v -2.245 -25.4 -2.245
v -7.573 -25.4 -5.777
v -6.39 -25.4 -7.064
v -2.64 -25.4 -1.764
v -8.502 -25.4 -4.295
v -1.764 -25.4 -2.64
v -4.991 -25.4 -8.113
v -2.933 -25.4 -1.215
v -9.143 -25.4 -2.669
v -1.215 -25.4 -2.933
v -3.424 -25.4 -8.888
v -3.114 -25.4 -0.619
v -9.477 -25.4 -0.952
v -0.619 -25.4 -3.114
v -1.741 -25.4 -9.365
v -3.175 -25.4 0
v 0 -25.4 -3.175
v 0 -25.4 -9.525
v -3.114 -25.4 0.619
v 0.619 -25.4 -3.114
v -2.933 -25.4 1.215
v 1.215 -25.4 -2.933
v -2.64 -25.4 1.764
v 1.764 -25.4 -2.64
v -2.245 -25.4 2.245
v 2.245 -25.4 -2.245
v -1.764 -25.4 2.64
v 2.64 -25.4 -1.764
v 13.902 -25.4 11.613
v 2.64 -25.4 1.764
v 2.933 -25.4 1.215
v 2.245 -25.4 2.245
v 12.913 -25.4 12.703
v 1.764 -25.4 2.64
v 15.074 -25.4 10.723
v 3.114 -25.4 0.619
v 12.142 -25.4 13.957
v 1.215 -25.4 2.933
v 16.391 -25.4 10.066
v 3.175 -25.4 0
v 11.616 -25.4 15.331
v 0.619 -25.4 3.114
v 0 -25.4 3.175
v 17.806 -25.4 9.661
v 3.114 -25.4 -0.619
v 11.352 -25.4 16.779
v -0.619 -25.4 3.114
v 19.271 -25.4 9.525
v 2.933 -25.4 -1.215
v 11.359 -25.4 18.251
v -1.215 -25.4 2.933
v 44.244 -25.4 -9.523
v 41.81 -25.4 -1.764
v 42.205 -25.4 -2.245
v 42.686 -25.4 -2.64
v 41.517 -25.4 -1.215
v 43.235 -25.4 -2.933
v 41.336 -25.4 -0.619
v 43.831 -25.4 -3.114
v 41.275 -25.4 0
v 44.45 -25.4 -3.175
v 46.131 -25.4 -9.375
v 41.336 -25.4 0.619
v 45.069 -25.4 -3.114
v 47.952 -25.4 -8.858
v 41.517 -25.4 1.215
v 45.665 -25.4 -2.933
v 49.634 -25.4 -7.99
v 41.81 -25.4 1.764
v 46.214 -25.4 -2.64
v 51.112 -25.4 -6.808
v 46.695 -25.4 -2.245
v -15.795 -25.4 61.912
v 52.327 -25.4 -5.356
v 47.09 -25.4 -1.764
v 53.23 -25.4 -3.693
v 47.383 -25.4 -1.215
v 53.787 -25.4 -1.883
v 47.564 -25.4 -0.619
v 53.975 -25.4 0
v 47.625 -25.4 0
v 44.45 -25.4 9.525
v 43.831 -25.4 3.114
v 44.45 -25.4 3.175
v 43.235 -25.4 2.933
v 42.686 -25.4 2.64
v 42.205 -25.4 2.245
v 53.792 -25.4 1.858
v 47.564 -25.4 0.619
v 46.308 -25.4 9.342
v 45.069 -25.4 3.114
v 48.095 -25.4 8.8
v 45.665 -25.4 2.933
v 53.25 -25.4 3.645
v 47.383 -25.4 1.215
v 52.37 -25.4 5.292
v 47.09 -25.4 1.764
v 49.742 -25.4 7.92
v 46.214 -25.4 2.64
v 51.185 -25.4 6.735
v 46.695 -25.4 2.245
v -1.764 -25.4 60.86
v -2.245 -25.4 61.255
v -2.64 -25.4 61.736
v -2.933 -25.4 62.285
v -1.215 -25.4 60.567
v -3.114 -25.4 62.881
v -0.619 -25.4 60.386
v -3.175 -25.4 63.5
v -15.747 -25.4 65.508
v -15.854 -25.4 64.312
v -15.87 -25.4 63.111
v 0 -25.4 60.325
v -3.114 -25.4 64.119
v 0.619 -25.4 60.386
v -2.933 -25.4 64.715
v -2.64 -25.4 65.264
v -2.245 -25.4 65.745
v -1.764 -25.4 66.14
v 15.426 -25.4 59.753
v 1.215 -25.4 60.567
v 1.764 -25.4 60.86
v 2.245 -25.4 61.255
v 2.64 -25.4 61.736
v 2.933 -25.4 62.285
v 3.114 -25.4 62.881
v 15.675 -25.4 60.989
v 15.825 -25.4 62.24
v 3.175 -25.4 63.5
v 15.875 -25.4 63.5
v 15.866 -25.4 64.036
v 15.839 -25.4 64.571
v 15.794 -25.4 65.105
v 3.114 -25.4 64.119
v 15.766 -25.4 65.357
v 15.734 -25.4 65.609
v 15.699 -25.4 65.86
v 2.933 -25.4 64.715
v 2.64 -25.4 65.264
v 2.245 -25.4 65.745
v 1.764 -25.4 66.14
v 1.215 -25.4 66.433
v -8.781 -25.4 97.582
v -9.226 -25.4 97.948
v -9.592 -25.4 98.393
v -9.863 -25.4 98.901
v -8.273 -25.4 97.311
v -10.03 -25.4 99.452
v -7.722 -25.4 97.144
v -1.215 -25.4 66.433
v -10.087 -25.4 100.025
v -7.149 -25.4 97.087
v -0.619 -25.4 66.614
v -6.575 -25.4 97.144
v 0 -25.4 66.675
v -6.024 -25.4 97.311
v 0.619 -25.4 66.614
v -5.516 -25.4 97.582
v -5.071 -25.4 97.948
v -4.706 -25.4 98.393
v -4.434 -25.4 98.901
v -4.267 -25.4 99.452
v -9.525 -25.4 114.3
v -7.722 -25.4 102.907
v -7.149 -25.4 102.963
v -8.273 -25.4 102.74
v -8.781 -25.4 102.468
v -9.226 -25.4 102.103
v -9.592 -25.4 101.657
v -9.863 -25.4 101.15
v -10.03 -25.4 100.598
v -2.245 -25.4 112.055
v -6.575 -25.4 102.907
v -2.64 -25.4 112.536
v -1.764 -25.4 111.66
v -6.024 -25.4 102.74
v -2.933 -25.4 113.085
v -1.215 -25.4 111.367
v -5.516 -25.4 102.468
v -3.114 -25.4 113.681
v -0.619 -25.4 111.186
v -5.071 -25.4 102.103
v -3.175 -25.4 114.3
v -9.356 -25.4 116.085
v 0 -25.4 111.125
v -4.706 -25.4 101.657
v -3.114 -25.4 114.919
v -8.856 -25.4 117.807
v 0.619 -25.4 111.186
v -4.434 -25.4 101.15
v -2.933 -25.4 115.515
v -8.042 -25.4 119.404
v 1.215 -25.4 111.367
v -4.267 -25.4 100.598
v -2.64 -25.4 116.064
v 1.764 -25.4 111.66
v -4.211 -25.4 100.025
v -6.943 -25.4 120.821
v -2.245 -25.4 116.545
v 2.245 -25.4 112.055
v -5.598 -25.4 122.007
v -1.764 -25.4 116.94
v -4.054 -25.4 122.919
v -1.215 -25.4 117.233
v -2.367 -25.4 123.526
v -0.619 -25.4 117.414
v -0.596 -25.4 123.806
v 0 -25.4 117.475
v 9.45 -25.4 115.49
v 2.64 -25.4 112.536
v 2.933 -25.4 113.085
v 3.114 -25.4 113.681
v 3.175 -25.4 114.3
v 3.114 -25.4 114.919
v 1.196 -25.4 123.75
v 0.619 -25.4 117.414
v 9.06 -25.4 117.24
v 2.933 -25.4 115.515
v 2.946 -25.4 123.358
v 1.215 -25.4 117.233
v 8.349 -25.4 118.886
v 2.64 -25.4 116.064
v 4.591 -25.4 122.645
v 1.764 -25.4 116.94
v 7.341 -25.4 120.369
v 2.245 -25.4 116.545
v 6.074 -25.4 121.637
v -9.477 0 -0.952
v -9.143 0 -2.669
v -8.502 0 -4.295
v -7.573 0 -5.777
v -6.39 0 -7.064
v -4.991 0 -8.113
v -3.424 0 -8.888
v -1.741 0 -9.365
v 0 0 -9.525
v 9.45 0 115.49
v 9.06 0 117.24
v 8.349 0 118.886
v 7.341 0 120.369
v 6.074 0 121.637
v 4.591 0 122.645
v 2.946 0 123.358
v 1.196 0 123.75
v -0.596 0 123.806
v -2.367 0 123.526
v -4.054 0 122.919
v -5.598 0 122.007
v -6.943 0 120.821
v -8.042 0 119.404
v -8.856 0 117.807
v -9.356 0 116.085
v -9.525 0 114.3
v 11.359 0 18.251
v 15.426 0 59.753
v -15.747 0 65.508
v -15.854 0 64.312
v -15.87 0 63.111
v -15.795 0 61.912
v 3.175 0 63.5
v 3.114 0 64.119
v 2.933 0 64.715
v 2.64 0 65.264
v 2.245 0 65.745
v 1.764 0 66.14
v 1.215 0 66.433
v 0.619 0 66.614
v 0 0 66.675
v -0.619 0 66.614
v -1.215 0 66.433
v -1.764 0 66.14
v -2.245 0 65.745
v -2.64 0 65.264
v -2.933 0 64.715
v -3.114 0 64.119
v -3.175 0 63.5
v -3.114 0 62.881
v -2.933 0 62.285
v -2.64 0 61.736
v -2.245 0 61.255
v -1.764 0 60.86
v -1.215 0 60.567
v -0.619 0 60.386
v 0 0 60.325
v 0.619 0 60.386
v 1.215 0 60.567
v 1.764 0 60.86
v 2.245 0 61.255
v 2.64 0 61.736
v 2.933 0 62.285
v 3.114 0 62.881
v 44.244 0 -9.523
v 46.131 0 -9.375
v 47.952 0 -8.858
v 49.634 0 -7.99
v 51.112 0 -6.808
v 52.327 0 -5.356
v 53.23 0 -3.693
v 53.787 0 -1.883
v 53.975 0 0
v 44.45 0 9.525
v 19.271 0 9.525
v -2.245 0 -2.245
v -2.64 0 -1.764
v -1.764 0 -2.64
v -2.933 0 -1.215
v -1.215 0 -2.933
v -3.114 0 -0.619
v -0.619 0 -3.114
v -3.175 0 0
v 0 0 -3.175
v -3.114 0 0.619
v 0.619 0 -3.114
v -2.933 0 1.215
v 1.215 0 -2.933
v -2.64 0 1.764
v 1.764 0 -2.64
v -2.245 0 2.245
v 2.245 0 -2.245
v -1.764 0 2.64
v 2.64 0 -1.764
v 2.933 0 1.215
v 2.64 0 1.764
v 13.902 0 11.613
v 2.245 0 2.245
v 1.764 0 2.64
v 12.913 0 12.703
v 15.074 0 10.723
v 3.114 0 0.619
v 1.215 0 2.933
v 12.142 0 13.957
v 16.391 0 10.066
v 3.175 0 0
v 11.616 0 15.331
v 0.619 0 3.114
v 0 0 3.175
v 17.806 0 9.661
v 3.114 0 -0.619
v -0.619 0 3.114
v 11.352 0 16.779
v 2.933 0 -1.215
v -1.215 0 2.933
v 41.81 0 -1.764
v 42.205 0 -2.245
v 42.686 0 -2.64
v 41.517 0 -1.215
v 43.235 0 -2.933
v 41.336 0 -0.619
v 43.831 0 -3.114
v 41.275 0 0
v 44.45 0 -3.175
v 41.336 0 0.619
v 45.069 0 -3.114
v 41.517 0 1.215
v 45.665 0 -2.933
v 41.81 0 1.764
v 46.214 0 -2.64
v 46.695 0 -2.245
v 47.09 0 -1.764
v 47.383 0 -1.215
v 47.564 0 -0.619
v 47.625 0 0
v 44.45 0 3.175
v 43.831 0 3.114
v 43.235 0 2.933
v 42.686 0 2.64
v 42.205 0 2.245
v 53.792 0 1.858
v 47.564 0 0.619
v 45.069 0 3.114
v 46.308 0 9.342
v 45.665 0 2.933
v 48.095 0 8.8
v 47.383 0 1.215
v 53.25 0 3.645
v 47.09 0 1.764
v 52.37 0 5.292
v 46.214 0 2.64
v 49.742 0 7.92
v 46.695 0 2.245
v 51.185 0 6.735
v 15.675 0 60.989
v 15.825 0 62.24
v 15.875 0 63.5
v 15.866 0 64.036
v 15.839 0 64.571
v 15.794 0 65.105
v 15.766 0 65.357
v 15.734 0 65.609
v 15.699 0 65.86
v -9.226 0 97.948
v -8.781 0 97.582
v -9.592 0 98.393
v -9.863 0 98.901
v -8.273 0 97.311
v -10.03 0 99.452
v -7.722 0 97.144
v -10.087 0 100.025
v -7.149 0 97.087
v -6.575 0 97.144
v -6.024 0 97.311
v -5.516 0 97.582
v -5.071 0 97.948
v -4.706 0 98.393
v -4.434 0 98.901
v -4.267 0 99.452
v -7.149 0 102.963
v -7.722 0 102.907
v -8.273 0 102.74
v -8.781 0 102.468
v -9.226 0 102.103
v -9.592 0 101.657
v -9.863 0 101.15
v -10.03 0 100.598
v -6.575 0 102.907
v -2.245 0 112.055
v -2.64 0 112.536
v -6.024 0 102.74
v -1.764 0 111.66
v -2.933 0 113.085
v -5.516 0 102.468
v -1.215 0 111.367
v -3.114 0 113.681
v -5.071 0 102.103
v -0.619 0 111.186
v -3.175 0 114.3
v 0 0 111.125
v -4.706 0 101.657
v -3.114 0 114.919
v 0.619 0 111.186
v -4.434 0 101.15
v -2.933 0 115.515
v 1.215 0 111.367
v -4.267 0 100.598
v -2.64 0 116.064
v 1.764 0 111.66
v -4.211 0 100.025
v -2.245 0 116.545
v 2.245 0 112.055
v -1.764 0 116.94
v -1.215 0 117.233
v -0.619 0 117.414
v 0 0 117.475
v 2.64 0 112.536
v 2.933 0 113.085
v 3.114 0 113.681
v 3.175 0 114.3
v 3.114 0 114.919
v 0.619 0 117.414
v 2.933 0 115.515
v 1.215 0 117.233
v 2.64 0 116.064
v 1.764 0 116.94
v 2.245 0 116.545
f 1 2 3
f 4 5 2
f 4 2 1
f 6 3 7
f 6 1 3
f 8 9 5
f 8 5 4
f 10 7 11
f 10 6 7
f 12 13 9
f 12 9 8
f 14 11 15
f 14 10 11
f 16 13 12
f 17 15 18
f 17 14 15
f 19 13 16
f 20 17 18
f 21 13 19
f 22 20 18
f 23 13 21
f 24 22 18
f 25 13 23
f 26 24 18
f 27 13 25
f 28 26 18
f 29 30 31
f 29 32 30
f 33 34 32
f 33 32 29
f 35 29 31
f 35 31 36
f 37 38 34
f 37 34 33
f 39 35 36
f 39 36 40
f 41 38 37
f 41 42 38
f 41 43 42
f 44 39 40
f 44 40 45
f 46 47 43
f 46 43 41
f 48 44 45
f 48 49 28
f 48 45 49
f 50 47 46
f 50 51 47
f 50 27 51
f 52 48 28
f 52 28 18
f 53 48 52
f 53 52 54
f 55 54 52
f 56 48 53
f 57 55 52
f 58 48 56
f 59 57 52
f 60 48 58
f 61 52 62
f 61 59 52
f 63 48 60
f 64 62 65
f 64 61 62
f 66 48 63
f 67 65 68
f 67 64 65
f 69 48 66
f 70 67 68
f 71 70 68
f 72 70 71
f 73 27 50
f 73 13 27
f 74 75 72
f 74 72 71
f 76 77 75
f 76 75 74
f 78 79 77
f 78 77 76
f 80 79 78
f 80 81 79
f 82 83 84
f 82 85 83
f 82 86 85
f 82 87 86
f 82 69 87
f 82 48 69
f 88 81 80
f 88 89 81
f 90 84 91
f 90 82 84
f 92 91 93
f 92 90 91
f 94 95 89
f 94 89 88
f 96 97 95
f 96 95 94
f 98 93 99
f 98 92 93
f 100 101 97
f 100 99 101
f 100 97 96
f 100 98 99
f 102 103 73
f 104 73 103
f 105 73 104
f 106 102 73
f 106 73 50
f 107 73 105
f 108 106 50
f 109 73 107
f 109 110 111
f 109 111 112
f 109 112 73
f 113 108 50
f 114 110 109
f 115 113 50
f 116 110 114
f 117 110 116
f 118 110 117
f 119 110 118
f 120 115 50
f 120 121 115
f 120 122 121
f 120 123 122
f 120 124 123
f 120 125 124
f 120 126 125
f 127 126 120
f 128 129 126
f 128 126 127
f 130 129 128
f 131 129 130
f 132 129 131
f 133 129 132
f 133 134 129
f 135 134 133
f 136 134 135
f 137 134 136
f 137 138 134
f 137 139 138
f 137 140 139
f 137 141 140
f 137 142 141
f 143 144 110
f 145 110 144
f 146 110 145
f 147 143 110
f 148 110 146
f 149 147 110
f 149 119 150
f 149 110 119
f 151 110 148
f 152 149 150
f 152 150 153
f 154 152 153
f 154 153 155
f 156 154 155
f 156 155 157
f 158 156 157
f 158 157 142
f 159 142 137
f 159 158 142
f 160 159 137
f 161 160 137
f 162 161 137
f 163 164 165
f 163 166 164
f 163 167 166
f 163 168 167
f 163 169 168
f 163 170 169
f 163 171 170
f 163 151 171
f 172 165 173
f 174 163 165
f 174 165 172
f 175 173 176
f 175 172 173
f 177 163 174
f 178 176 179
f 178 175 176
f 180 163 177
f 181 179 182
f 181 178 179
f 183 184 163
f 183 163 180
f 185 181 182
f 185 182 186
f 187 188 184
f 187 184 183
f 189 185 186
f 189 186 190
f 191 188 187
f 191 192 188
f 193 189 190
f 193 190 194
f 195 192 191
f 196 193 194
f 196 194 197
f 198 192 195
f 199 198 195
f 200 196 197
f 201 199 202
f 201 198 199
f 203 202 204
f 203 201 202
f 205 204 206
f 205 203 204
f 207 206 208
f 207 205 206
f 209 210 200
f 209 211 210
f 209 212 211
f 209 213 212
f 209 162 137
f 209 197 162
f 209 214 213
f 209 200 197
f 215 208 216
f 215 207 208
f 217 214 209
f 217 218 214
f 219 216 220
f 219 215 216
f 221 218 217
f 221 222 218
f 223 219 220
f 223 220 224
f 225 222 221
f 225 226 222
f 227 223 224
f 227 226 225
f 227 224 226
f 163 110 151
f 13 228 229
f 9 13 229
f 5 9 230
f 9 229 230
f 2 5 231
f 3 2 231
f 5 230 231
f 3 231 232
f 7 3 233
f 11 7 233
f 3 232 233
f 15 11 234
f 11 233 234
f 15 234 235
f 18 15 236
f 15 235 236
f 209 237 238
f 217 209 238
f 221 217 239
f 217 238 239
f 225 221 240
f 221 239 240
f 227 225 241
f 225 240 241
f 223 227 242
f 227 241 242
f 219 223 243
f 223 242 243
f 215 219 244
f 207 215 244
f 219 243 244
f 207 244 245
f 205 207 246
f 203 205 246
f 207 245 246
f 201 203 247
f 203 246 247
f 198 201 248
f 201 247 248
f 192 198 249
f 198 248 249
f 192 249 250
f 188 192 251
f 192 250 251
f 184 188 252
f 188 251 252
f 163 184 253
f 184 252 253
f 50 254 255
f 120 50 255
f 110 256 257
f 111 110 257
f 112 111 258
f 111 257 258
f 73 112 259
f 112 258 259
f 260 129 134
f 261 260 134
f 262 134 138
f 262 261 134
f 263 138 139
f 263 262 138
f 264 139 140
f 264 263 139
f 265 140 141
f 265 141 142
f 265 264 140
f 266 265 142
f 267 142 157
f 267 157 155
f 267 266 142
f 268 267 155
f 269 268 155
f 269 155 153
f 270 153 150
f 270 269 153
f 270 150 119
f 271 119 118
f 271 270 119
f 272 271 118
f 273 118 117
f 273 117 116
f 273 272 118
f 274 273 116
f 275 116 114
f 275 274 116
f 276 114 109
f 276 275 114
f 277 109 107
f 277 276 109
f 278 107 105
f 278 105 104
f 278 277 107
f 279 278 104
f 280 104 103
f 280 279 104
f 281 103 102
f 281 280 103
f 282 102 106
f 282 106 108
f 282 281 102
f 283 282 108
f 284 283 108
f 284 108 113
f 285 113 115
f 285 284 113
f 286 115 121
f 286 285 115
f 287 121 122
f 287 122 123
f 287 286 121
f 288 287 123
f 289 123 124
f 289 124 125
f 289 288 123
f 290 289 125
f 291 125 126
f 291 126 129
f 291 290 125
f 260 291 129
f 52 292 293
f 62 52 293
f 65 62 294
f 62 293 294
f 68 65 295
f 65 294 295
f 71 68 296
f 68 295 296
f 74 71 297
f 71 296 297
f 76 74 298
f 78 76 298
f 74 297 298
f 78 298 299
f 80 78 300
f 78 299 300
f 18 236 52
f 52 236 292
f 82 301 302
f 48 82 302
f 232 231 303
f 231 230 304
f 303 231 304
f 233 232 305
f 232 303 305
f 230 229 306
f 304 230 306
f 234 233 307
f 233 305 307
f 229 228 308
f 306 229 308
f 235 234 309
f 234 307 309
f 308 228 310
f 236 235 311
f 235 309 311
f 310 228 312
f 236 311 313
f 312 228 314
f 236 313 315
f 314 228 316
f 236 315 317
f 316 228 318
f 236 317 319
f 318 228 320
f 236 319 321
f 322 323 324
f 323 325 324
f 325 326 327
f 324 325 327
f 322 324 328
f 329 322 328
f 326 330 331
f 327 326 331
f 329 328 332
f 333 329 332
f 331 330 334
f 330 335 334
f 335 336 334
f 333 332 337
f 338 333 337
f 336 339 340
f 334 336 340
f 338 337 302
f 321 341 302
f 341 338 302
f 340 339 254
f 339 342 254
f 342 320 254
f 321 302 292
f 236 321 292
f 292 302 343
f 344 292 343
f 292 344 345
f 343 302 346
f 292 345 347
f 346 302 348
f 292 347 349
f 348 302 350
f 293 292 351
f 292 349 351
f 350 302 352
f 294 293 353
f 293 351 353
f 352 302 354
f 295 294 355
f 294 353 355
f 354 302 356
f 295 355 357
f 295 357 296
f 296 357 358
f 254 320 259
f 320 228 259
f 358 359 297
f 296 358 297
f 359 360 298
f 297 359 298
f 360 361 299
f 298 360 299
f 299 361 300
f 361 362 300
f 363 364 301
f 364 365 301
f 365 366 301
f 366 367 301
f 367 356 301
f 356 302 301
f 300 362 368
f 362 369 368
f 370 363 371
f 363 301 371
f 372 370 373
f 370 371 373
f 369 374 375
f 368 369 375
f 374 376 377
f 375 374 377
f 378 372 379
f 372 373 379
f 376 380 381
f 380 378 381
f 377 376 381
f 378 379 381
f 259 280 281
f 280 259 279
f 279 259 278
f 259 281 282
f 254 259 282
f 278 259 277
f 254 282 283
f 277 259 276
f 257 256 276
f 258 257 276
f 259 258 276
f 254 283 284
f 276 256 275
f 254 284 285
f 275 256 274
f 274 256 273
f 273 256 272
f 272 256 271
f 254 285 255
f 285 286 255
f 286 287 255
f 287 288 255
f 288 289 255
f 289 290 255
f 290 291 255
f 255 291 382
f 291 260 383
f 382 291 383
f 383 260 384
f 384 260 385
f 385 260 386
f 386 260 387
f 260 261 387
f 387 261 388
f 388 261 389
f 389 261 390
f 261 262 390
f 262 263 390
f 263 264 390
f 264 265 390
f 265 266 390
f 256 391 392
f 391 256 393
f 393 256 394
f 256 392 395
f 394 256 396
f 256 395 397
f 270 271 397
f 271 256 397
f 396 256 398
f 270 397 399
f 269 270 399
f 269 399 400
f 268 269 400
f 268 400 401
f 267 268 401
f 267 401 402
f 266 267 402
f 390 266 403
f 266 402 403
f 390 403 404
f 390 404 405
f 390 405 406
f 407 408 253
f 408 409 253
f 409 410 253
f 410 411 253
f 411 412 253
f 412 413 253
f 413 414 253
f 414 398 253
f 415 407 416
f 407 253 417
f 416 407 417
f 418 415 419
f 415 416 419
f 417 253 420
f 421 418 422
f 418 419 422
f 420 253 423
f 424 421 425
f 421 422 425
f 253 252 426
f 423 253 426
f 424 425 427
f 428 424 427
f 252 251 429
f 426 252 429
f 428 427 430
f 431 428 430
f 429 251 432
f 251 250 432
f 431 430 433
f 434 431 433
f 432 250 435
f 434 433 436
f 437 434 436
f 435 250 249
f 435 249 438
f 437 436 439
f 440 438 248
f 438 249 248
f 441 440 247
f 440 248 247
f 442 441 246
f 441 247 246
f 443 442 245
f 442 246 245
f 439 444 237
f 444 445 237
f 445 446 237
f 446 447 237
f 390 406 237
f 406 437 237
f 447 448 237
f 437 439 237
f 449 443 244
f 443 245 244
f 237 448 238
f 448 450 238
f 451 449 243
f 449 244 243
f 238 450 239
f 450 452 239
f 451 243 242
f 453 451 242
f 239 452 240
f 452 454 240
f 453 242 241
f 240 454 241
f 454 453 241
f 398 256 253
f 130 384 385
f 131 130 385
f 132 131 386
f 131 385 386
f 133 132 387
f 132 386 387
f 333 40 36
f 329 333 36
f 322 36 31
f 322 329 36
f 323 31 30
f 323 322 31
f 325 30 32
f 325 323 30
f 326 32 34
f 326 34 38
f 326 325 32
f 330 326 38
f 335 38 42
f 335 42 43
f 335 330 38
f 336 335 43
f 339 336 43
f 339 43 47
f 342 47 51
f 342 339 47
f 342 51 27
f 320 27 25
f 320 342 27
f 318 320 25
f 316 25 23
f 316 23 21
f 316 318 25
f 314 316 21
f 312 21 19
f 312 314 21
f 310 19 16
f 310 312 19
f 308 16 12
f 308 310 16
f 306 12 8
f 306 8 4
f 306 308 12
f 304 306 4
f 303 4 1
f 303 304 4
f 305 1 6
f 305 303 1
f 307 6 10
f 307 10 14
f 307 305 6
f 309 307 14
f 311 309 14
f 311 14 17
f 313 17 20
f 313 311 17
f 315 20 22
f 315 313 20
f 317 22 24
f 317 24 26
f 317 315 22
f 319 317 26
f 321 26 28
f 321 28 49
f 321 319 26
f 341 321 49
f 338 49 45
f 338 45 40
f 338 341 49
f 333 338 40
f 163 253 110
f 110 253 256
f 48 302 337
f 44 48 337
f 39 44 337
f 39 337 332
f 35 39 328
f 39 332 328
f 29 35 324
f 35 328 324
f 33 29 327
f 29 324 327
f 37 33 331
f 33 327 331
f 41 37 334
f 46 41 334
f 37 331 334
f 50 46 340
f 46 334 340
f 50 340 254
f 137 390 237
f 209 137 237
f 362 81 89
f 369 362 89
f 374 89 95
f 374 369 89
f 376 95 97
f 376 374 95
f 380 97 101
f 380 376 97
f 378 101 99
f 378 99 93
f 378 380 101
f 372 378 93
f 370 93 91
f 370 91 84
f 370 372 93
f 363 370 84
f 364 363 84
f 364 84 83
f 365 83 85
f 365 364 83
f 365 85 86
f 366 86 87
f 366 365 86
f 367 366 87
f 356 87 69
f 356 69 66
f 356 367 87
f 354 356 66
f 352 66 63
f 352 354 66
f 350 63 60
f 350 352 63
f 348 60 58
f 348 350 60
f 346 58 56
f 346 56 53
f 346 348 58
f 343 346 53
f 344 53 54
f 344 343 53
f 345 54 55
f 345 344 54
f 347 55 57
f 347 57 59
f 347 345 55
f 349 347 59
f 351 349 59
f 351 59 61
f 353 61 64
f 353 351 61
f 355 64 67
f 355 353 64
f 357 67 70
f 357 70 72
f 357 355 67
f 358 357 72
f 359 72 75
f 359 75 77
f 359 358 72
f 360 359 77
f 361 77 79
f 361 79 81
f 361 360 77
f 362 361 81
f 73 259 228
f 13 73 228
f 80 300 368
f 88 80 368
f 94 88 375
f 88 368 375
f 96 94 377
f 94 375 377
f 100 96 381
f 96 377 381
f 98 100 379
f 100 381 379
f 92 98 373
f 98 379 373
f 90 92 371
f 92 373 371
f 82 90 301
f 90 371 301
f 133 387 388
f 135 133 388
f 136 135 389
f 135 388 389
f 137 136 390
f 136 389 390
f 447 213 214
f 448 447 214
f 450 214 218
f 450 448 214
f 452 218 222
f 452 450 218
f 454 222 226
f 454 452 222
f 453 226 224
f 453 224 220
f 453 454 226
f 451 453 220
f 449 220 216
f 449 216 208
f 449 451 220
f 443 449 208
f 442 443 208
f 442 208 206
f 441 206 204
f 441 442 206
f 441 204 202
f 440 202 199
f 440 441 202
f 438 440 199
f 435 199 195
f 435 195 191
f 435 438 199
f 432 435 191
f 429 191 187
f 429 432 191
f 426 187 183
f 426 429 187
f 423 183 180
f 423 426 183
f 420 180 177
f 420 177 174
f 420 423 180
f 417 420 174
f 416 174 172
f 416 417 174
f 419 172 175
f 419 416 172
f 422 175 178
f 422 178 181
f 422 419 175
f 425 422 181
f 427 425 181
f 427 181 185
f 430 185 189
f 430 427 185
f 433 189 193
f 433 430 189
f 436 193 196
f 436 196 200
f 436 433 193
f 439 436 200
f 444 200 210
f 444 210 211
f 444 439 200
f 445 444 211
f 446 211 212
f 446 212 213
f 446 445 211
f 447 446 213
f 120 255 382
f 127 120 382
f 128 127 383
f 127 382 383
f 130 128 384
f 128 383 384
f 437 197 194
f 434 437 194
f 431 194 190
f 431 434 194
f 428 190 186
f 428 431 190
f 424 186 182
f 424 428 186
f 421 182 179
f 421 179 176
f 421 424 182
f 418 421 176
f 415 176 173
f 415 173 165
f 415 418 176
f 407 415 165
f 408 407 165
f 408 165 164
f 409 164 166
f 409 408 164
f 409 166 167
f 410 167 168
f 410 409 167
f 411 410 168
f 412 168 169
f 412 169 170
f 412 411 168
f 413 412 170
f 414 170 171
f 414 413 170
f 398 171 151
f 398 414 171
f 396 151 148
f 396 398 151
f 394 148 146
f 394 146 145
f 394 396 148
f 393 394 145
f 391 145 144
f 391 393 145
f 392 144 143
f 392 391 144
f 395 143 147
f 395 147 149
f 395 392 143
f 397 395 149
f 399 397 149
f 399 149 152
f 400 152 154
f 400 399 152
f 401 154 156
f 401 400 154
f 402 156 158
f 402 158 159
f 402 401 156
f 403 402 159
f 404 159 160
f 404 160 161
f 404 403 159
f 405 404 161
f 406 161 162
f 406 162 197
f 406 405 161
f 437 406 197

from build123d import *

# Parameters (mm, degrees)
F0_R     = 3.175
F0_R_2   = 2.938042
F1_DEPTH = 25.4


with BuildPart() as f1:
    # F0 (on Front) → F1 (new body)
    with BuildSketch(Plane.XZ):
        with BuildLine():
            ThreePointArc((0, -9.525), (6.735192, -6.735192), (9.525, 0))
            ThreePointArc((9.525, 0), (-0.476848, 9.513056), (-9.477255, -0.9525))
            ThreePointArc((-9.477255, -0.9525), (-6.389564, -7.063929), (0, -9.525))
        make_face()
        Circle(F0_R, mode=Mode.SUBTRACT)
        with BuildLine():
            ThreePointArc((-9.477255, -0.9525), (-0.476848, 9.513056), (9.525, 0))
            ThreePointArc((9.525, 0), (6.735192, -6.735192), (0, -9.525))
            Line((0, -9.525), (44.244344, -9.52278))
            ThreePointArc((44.244344, -9.52278), (34.925555, 0.102834), (44.45, 9.525))
            Line((44.45, 9.525), (19.271431, 9.525254))
            ThreePointArc((19.271431, 9.525254), (13.382074, 12.135023), (11.359216, 18.25086))
            Line((11.359216, 18.25086), (15.426409, 59.752799))
            ThreePointArc((15.426409, 59.752799), (-1.0955, 47.662844), (-15.795426, 61.9125))
            Line((-15.795426, 61.9125), (-9.477255, -0.9525))
        make_face()
        with BuildLine():
            ThreePointArc((-15.747457, 65.508289), (-15.873588, 63.711757), (-15.795426, 61.9125))
            ThreePointArc((-15.795426, 61.9125), (-1.0955, 47.662844), (15.426409, 59.752799))
            ThreePointArc((15.426409, 59.752799), (15.762453, 61.613022), (15.875, 63.5))
            ThreePointArc((15.875, 63.5), (15.854646, 64.303636), (15.793636, 65.105211))
            Line((15.793636, 65.105211), (15.698666, 65.859557))
            ThreePointArc((15.698666, 65.859557), (-0.17732, 79.37401), (-15.747457, 65.508289))
        make_face()
        with Locations((0, 63.5)):
            Circle(F0_R, mode=Mode.SUBTRACT)
        with BuildLine():
            ThreePointArc((44.45, 9.525), (34.925555, 0.102834), (44.244344, -9.52278))
            ThreePointArc((44.244344, -9.52278), (51.112085, -6.807514), (53.975, 0))
            ThreePointArc((53.975, 0), (51.185192, 6.735192), (44.45, 9.525))
        make_face()
        with Locations((44.45, 0)):
            Circle(F0_R, mode=Mode.SUBTRACT)
        with BuildLine():
            Line((-9.525, 114.3), (-15.747457, 65.508289))
            ThreePointArc((-15.747457, 65.508289), (-0.17732, 79.37401), (15.698666, 65.859557))
            Line((15.698666, 65.859557), (9.4504, 115.489771))
            ThreePointArc((9.4504, 115.489771), (9.506332, 114.896054), (9.525, 114.3))
            ThreePointArc((9.525, 114.3), (0, 104.775), (-9.525, 114.3))
        make_face()
        with Locations((-7.148621, 100.0252)):
            Circle(F0_R_2, mode=Mode.SUBTRACT)
        with BuildLine():
            ThreePointArc((15.793636, 65.105211), (15.750667, 65.482952), (15.698666, 65.859557))
            Line((15.698666, 65.859557), (15.793636, 65.105211))
        make_face()
        with BuildLine():
            ThreePointArc((9.4504, 115.489771), (-0.596054, 123.806332), (-9.525, 114.3))
            ThreePointArc((-9.525, 114.3), (0, 104.775), (9.525, 114.3))
            ThreePointArc((9.525, 114.3), (9.506332, 114.896054), (9.4504, 115.489771))
        make_face()
        with Locations((0, 114.3)):
            Circle(F0_R, mode=Mode.SUBTRACT)
    extrude(amount=F1_DEPTH)


solid = f1.part
